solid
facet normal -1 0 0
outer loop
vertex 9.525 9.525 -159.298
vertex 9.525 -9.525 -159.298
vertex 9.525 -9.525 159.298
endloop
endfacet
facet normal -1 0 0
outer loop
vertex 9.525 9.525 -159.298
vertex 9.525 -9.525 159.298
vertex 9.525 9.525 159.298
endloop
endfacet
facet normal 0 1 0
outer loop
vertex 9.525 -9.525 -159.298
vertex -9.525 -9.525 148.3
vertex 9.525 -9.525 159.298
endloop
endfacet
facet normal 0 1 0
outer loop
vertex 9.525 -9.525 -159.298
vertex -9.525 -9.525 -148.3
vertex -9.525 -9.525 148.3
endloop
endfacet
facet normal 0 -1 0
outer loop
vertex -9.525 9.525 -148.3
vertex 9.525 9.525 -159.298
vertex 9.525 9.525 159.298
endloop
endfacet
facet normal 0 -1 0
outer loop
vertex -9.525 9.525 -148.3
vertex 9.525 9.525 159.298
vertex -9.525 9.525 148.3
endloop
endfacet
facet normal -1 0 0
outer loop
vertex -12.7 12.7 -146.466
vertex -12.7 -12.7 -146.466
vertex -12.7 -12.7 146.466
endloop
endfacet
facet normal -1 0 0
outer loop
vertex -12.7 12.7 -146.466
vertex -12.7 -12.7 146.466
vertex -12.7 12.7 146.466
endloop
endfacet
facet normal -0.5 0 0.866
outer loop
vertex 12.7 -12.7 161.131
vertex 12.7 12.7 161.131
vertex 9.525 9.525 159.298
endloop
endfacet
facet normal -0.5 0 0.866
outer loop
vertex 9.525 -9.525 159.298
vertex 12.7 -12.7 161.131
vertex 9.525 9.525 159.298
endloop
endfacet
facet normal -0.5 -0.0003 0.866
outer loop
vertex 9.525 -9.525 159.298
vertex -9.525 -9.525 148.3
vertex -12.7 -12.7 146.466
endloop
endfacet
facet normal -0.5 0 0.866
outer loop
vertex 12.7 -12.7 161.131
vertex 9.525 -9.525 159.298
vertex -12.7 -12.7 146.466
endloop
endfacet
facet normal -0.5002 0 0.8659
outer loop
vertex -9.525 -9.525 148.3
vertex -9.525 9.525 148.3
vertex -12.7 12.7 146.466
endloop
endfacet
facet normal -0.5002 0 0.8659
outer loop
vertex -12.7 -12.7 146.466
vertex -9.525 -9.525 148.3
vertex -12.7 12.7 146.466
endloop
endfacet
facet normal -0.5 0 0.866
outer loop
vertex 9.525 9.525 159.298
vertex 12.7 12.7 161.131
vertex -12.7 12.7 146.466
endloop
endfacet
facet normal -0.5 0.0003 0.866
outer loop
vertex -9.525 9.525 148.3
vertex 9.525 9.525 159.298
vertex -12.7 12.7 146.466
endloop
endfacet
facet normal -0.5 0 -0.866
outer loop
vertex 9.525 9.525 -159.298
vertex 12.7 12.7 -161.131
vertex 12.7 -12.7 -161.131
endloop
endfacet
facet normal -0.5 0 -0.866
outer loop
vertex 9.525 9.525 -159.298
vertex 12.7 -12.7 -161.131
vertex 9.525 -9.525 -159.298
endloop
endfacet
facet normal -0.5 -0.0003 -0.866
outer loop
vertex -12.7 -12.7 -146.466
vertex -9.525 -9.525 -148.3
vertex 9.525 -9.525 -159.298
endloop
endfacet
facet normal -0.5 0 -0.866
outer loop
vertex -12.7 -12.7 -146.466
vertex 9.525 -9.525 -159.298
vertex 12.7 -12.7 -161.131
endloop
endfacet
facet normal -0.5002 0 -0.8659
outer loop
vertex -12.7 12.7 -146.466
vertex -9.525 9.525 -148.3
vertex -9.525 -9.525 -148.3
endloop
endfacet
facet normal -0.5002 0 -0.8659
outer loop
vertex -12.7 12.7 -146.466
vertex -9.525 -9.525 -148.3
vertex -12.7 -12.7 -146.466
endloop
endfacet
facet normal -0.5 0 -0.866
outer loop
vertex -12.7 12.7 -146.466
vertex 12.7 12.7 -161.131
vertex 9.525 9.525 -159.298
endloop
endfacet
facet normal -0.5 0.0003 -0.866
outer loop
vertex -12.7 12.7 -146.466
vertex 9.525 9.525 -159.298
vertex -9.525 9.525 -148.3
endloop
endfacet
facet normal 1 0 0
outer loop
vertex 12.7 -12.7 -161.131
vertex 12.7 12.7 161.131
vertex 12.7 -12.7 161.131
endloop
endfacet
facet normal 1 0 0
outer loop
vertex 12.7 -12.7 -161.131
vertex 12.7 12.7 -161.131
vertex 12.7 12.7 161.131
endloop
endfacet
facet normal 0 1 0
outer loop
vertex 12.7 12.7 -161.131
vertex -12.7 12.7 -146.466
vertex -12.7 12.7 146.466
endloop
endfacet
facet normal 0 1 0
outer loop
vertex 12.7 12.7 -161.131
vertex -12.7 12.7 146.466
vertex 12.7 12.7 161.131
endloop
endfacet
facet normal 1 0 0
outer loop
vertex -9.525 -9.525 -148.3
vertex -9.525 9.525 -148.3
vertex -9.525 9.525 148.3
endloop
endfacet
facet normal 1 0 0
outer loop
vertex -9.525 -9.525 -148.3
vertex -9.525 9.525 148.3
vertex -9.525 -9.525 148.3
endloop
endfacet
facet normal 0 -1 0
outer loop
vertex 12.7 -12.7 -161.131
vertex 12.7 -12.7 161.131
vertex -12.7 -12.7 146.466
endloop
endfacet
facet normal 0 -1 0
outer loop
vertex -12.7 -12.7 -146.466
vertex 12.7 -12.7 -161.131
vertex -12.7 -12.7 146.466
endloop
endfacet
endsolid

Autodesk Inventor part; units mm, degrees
ref_plane "YZ Plane" through (0, 0, 0) normal (1, 0, 0) x (0, 1, 0)
ref_plane "XZ Plane" through (0, 0, 0) normal (0, 1, 0) x (-1, 0, 0)
ref_plane "XY Plane" through (0, 0, 0) normal (0, 0, 1) x (1, 0, 0)
sketch "Sketch1" plane through (0, 0, 0) normal (0, 0, 1) x (1, 0, 0)
  line L0 (-17.78, 0) -> (17.78, 0) projected
  line L1 (0, -17.78) -> (0, 17.78) projected
  line L2 (-12.7, 12.7) -> (12.7, 12.7)
  line L3 (12.7, 12.7) -> (12.7, -12.7)
  line L4 (12.7, -12.7) -> (-12.7, -12.7)
  line L5 (-12.7, -12.7) -> (-12.7, 12.7)
  line L6 (9.525, 9.525) -> (-9.525, 9.525)
  line L7 (-9.525, 9.525) -> (-9.525, -9.525)
  line L8 (-9.525, -9.525) -> (9.525, -9.525)
  line L9 (9.525, -9.525) -> (9.525, 9.525)
  point P0 (0, 0)
  point P1 (-12.7, 0)
  point P2 (0, 12.7)
  dimension "d0" = 25.4
  dimension "d1" = 3.175
extrude "Base" add sketch "Sketch1" along normal mid plane 322.2625 contours L5 L2 L1 L6 L7 L0 | L0 L7 L8 L1 L4 L5 | L1 L8 L9 L0 L3 L4 | L2 L3 L0 L9 L6 L1
sketch "Sketch6" plane through (-12.7, 12.7, 161.1312) normal (0, 1, 0) x (1, 0, 0)
  line L0 (0, 0) -> (25.4, 0) projected
  line L1 (0, 322.2625) -> (0, 0) projected
  line L2 (25.4, 0) -> (0, 14.6647)
  point P0 (12.7, 161.1312)
  dimension "d15" = 30
extrude "Extrusion6" cut sketch "Sketch6" against normal through all
sketch "Sketch7" plane through (-12.7, 12.7, -161.1312) normal (0, 1, 0) x (1, 0, 0)
  line L0 (25.4, 0) -> (0, 0) projected
  line L1 (0, 0) -> (0, -307.5978) projected
  line L2 (25.4, 0) -> (0, -14.6647)
  point P0 (12.7, -161.1312)
  dimension "d18" = 30
extrude "Extrusion7" cut sketch "Sketch7" against normal through all
properties part number "tubing_template_0.125" material "Aluminum-6061"
